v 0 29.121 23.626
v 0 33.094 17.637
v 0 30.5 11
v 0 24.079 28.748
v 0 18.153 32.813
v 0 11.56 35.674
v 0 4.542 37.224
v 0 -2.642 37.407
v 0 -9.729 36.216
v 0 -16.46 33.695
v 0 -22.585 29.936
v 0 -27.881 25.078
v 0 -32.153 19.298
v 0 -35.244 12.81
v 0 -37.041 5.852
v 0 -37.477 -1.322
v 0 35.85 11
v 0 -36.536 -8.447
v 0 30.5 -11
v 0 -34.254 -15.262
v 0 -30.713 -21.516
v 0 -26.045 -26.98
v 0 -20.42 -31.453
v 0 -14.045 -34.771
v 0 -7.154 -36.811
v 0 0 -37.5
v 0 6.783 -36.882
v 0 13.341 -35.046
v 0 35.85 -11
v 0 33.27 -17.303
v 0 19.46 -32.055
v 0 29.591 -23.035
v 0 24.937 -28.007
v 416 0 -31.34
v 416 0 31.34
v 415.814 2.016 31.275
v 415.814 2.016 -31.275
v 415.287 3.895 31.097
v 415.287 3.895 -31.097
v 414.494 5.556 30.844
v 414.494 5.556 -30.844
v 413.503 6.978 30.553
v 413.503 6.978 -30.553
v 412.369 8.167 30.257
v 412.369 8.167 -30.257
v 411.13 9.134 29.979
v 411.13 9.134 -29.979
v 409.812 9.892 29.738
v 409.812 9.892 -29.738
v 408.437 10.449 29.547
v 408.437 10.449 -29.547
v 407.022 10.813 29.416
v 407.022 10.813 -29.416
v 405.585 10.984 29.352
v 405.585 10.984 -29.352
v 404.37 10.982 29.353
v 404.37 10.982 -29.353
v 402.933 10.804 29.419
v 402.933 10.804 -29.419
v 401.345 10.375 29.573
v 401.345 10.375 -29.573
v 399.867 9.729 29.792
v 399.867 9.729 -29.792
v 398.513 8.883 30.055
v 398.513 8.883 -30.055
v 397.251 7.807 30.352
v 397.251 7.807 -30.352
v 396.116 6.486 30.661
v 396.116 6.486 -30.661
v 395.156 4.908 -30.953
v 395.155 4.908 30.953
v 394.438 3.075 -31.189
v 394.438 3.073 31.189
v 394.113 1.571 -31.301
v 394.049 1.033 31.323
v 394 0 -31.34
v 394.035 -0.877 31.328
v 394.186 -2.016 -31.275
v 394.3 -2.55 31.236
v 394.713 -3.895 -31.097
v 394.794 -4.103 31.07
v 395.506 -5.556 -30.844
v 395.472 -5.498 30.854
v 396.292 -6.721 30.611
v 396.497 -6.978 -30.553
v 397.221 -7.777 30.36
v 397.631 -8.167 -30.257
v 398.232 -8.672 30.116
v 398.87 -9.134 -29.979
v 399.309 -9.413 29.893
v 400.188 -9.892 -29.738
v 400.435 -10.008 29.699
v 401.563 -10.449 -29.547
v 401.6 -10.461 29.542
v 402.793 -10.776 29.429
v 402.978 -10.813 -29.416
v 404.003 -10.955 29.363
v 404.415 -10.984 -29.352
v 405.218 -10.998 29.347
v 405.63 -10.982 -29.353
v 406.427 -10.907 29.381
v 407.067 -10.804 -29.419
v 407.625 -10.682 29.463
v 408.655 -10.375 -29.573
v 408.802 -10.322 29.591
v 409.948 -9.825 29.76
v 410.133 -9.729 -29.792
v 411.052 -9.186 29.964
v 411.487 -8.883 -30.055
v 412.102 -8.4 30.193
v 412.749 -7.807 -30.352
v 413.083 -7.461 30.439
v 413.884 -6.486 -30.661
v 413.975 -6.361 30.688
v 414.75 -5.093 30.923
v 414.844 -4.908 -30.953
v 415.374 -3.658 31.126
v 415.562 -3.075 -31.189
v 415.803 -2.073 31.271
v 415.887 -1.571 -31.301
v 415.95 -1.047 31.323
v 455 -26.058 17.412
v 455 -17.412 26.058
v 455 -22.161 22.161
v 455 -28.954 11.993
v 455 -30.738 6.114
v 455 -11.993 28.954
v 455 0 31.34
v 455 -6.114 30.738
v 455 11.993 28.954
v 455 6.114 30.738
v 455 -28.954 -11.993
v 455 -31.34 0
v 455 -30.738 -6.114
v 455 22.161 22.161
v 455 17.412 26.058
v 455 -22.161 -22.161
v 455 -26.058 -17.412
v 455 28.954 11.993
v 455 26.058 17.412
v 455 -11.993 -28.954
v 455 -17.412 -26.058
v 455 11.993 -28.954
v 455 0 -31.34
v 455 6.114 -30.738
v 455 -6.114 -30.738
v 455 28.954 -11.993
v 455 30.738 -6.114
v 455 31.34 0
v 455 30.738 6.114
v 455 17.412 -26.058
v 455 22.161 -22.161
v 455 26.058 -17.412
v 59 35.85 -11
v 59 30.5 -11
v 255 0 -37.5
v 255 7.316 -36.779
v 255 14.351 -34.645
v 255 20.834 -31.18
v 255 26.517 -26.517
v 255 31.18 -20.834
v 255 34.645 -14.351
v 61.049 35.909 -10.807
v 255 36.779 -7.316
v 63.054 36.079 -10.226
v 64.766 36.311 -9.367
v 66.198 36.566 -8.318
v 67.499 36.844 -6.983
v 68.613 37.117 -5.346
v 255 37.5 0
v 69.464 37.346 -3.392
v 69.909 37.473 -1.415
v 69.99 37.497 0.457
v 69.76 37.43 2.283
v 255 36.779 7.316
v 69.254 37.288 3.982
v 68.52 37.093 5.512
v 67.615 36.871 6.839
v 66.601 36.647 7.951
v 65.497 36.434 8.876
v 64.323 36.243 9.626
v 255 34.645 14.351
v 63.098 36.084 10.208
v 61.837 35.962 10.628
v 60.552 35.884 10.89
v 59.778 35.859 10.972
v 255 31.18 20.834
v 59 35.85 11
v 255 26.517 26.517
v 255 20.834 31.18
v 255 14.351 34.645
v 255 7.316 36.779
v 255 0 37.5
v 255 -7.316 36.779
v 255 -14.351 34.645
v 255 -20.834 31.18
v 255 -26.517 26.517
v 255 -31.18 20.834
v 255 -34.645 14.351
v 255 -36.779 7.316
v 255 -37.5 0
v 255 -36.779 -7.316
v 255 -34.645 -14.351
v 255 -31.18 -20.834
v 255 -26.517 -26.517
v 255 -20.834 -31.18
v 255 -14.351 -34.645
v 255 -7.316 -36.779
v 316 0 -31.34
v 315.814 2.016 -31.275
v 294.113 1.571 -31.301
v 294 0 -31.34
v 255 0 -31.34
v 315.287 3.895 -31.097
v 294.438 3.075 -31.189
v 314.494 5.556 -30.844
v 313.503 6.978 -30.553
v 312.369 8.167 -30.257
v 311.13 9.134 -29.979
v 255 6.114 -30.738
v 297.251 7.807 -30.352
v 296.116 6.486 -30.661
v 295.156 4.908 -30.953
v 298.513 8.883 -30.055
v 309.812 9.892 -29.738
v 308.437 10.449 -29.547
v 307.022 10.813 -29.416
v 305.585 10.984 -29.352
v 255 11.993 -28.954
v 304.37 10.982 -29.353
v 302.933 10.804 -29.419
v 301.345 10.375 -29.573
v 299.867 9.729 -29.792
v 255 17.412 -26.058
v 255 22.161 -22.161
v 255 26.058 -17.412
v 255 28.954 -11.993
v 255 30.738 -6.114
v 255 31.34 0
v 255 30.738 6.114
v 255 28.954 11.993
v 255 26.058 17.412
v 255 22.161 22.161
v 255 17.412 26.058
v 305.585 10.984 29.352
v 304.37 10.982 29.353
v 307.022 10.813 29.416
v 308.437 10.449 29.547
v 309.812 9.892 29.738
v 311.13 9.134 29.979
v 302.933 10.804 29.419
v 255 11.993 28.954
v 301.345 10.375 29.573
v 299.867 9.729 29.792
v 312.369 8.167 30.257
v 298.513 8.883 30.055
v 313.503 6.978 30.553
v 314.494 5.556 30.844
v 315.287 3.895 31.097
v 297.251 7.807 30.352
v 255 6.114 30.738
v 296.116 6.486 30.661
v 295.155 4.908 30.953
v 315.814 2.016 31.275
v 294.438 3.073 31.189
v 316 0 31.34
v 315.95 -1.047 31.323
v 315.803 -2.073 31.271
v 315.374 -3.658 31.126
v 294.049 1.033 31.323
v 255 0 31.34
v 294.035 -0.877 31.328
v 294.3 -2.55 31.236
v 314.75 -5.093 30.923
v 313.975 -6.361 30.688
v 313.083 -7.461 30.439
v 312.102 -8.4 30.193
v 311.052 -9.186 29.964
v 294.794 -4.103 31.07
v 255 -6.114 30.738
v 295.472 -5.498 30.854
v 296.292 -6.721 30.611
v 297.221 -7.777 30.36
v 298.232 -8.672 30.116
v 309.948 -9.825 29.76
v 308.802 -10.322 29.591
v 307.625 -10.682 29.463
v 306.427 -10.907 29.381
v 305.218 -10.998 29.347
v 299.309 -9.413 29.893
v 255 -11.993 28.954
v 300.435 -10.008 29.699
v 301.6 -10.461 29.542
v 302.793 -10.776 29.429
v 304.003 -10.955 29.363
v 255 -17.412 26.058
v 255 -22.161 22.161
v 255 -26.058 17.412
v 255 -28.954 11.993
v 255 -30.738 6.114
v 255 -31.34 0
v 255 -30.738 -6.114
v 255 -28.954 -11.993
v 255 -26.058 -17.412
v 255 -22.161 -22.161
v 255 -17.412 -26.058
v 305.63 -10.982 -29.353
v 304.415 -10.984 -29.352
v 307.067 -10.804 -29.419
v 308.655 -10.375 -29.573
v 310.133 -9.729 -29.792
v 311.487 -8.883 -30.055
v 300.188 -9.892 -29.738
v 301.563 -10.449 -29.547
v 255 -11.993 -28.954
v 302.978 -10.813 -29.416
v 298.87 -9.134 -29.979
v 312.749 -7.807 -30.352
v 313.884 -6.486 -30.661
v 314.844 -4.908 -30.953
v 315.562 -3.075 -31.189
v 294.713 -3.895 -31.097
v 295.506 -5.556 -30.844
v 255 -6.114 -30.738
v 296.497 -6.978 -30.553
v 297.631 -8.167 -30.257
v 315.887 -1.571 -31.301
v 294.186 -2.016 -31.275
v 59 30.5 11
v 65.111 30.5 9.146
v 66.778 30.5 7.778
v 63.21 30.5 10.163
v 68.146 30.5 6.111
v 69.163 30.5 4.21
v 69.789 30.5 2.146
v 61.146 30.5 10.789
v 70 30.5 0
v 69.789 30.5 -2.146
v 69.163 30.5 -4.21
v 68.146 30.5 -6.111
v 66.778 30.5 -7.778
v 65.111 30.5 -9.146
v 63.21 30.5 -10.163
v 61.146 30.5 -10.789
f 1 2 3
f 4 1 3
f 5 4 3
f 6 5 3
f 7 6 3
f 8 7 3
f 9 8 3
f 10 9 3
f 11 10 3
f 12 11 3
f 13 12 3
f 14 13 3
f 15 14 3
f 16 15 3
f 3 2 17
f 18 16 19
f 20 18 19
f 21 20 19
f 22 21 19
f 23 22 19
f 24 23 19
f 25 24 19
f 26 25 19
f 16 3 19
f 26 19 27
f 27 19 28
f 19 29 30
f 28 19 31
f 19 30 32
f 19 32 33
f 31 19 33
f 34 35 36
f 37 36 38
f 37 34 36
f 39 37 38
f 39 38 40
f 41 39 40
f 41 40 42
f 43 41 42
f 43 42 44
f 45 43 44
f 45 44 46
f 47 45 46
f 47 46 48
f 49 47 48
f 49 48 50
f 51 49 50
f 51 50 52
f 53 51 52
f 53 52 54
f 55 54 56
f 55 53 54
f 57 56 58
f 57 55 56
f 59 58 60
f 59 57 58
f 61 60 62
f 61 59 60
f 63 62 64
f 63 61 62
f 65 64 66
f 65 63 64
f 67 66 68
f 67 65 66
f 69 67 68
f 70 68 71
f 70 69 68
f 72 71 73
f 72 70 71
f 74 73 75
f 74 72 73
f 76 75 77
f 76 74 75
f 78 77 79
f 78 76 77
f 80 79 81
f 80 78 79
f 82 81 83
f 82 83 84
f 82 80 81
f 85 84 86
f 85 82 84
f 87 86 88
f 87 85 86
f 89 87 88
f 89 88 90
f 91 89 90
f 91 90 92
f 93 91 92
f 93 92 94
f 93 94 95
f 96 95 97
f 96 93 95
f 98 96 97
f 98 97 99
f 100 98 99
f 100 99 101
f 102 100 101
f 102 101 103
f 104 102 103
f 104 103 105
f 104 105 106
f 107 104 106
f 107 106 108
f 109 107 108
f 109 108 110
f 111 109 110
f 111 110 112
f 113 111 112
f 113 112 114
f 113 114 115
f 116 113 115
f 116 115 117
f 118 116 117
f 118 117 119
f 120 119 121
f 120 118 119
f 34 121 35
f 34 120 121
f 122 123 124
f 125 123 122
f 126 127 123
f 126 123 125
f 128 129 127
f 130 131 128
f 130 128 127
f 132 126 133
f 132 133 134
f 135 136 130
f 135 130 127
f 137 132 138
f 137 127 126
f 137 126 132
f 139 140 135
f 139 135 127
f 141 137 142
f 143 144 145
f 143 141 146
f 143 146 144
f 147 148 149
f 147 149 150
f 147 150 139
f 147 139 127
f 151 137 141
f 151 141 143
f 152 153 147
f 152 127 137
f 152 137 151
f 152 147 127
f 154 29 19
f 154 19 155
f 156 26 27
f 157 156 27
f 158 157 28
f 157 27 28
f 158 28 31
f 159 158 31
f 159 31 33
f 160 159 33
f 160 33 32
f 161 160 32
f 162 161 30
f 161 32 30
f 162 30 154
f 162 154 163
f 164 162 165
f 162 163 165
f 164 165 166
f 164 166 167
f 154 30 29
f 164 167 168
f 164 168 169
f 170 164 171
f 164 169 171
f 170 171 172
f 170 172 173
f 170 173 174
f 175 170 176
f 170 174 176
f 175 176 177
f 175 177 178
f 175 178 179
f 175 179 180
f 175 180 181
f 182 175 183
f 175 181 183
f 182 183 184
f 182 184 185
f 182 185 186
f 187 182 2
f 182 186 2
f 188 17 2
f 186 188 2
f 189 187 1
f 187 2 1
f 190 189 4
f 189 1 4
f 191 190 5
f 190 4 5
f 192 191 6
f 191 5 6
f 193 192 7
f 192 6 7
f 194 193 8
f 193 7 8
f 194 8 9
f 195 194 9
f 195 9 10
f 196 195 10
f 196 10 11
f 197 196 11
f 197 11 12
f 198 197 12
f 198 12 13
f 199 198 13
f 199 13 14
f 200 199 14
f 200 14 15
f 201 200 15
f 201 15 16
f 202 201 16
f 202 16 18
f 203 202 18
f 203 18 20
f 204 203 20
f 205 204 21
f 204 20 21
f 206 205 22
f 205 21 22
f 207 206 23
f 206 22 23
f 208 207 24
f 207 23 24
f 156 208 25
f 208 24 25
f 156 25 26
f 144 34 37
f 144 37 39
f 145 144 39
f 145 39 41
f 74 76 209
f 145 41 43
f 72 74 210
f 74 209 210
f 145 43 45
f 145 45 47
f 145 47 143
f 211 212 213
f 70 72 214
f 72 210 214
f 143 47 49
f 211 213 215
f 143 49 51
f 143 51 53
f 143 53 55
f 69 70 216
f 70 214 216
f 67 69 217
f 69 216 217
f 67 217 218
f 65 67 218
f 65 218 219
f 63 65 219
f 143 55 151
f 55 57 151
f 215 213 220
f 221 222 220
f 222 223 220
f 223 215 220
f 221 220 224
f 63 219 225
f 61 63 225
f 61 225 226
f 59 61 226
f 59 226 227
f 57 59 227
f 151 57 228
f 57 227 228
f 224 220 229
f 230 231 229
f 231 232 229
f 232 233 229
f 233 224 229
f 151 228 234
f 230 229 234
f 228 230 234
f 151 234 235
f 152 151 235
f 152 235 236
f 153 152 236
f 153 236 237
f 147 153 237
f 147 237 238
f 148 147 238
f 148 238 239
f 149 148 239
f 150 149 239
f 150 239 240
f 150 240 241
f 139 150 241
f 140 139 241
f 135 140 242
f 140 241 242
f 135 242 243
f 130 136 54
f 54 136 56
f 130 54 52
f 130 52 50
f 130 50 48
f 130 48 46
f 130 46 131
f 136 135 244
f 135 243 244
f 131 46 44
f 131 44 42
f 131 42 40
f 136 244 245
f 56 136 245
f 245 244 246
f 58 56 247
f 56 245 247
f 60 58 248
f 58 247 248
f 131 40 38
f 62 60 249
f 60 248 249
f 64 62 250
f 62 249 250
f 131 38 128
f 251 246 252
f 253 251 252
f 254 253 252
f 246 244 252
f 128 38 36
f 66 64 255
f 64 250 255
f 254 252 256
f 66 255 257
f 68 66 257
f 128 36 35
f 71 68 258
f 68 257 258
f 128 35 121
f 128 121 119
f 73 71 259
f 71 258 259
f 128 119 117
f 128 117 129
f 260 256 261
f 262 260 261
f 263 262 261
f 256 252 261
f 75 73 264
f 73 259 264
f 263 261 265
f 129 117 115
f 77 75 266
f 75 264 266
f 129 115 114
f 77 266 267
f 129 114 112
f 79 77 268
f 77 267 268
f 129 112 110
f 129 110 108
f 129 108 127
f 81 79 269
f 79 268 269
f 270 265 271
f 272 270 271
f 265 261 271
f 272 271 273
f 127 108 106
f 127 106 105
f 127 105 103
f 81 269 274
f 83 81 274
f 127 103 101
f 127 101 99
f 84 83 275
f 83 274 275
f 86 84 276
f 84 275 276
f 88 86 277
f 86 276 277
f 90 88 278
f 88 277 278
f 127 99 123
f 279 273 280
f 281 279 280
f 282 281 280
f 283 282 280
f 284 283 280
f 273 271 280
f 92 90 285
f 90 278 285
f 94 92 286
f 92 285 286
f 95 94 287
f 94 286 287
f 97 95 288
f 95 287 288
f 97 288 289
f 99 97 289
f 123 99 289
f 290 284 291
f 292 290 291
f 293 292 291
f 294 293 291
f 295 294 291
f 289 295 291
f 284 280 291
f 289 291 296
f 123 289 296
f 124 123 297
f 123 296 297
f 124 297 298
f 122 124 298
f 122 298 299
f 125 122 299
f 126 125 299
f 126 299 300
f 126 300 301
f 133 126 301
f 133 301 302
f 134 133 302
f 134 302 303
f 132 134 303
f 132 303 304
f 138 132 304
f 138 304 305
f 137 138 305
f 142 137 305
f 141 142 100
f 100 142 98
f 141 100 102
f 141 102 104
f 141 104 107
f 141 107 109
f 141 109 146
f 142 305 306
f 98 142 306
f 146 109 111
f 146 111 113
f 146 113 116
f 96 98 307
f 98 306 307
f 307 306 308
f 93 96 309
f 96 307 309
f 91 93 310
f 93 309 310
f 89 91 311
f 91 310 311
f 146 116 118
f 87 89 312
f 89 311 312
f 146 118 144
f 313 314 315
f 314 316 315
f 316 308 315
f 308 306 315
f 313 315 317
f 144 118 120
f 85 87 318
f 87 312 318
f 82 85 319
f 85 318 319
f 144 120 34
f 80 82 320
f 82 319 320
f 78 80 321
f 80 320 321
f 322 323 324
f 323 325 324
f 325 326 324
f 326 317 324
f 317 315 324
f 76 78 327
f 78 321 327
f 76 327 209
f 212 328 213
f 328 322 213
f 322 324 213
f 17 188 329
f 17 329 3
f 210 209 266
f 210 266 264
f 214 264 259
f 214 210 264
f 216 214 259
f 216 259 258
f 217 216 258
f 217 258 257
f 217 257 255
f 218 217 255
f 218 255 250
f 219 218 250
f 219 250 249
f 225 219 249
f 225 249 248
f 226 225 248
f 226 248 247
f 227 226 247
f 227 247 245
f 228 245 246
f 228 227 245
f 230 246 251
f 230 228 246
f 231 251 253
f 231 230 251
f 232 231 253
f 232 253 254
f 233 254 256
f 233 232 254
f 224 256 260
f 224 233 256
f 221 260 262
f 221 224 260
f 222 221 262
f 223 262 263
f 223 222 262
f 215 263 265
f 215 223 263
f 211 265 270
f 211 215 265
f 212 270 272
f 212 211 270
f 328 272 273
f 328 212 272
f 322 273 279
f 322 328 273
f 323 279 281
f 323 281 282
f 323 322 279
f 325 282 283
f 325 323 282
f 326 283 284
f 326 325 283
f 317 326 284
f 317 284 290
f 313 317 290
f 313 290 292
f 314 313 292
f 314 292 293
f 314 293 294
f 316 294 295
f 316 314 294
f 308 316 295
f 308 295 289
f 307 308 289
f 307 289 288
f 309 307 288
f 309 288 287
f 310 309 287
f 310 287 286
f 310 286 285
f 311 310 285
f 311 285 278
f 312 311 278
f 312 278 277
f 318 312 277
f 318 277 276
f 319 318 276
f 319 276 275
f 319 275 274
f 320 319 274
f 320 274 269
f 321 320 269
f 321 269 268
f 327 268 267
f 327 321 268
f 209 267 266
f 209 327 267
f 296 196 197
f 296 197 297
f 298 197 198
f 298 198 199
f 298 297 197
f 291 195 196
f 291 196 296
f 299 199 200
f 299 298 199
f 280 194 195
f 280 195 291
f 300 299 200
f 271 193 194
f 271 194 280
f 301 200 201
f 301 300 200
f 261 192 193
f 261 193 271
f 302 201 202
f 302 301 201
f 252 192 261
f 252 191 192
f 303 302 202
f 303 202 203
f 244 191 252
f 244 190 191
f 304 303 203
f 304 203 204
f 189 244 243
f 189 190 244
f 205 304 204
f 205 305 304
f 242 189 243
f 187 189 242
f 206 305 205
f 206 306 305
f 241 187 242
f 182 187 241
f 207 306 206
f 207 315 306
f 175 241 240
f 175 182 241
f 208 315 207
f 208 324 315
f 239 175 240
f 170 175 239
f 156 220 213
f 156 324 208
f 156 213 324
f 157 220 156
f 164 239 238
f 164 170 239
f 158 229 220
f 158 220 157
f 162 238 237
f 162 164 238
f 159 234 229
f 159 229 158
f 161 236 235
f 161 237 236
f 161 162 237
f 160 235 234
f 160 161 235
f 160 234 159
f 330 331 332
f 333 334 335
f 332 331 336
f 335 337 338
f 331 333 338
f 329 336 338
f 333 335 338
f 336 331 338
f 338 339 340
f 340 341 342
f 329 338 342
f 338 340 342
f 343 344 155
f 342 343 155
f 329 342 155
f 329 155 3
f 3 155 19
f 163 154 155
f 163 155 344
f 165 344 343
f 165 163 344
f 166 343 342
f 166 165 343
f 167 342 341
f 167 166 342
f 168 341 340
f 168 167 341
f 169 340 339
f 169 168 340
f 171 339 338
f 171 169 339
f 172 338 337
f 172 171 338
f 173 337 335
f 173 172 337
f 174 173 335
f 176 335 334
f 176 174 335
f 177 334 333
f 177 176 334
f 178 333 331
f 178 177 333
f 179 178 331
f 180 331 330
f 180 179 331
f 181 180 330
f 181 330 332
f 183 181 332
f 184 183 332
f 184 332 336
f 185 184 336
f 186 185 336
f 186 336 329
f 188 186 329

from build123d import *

# Parameters (mm, degrees)
SKETCH1_R               = 37.5
BOSS_EXTRUDE1_DEPTH     = 255
SKETCH2_R               = 31.34
BOSS_EXTRUDE2_DEPTH     = 200
CUT_EXTRUDE1_DEPTH      = 7
CUT_EXTRUDE2_DEPTH      = 459.080233163
CUT_EXTRUDE2_DEPTH_BACK = 459.080233163
SKETCH4_R               = 11


with BuildPart() as part:
    # Sketch1 → Boss-Extrude1 (new body)
    with BuildSketch(Plane(origin=(0, 0, 0), x_dir=(0, 0, -1), z_dir=(1, 0, 0))):
        Circle(SKETCH1_R)
    extrude(amount=BOSS_EXTRUDE1_DEPTH)

    # Sketch2 → Boss-Extrude2 (add)
    with BuildSketch(Plane(origin=(255, 0, 0), x_dir=(0, 0, -1), z_dir=(1, 0, 0))):
        Circle(SKETCH2_R)
    extrude(amount=BOSS_EXTRUDE2_DEPTH)

    # Sketch3 → Cut-Extrude1 (cut)
    with BuildSketch(Plane(origin=(0, 37.5, 0), x_dir=(1, 0, 0), z_dir=(0, 1, 0))):
        with BuildLine():
            Line((59, -11), (0, -11))
            Line((0, -11), (0, 11))
            Line((0, 11), (59, 11))
            ThreePointArc((59, 11), (70, 0), (59, -11))
        make_face()
    extrude(amount=-CUT_EXTRUDE1_DEPTH, mode=Mode.SUBTRACT)

    # Sketch4 → Cut-Extrude2 (cut, two sides: drawn at the far end of the back side and taken through both)
    with BuildSketch(Plane.XY.offset(-CUT_EXTRUDE2_DEPTH_BACK)):
        with Locations((405, 0)):
            Circle(SKETCH4_R)
        with Locations((305, 0)):
            Circle(SKETCH4_R)
    extrude(amount=CUT_EXTRUDE2_DEPTH + CUT_EXTRUDE2_DEPTH_BACK, mode=Mode.SUBTRACT)


solid = part.part
